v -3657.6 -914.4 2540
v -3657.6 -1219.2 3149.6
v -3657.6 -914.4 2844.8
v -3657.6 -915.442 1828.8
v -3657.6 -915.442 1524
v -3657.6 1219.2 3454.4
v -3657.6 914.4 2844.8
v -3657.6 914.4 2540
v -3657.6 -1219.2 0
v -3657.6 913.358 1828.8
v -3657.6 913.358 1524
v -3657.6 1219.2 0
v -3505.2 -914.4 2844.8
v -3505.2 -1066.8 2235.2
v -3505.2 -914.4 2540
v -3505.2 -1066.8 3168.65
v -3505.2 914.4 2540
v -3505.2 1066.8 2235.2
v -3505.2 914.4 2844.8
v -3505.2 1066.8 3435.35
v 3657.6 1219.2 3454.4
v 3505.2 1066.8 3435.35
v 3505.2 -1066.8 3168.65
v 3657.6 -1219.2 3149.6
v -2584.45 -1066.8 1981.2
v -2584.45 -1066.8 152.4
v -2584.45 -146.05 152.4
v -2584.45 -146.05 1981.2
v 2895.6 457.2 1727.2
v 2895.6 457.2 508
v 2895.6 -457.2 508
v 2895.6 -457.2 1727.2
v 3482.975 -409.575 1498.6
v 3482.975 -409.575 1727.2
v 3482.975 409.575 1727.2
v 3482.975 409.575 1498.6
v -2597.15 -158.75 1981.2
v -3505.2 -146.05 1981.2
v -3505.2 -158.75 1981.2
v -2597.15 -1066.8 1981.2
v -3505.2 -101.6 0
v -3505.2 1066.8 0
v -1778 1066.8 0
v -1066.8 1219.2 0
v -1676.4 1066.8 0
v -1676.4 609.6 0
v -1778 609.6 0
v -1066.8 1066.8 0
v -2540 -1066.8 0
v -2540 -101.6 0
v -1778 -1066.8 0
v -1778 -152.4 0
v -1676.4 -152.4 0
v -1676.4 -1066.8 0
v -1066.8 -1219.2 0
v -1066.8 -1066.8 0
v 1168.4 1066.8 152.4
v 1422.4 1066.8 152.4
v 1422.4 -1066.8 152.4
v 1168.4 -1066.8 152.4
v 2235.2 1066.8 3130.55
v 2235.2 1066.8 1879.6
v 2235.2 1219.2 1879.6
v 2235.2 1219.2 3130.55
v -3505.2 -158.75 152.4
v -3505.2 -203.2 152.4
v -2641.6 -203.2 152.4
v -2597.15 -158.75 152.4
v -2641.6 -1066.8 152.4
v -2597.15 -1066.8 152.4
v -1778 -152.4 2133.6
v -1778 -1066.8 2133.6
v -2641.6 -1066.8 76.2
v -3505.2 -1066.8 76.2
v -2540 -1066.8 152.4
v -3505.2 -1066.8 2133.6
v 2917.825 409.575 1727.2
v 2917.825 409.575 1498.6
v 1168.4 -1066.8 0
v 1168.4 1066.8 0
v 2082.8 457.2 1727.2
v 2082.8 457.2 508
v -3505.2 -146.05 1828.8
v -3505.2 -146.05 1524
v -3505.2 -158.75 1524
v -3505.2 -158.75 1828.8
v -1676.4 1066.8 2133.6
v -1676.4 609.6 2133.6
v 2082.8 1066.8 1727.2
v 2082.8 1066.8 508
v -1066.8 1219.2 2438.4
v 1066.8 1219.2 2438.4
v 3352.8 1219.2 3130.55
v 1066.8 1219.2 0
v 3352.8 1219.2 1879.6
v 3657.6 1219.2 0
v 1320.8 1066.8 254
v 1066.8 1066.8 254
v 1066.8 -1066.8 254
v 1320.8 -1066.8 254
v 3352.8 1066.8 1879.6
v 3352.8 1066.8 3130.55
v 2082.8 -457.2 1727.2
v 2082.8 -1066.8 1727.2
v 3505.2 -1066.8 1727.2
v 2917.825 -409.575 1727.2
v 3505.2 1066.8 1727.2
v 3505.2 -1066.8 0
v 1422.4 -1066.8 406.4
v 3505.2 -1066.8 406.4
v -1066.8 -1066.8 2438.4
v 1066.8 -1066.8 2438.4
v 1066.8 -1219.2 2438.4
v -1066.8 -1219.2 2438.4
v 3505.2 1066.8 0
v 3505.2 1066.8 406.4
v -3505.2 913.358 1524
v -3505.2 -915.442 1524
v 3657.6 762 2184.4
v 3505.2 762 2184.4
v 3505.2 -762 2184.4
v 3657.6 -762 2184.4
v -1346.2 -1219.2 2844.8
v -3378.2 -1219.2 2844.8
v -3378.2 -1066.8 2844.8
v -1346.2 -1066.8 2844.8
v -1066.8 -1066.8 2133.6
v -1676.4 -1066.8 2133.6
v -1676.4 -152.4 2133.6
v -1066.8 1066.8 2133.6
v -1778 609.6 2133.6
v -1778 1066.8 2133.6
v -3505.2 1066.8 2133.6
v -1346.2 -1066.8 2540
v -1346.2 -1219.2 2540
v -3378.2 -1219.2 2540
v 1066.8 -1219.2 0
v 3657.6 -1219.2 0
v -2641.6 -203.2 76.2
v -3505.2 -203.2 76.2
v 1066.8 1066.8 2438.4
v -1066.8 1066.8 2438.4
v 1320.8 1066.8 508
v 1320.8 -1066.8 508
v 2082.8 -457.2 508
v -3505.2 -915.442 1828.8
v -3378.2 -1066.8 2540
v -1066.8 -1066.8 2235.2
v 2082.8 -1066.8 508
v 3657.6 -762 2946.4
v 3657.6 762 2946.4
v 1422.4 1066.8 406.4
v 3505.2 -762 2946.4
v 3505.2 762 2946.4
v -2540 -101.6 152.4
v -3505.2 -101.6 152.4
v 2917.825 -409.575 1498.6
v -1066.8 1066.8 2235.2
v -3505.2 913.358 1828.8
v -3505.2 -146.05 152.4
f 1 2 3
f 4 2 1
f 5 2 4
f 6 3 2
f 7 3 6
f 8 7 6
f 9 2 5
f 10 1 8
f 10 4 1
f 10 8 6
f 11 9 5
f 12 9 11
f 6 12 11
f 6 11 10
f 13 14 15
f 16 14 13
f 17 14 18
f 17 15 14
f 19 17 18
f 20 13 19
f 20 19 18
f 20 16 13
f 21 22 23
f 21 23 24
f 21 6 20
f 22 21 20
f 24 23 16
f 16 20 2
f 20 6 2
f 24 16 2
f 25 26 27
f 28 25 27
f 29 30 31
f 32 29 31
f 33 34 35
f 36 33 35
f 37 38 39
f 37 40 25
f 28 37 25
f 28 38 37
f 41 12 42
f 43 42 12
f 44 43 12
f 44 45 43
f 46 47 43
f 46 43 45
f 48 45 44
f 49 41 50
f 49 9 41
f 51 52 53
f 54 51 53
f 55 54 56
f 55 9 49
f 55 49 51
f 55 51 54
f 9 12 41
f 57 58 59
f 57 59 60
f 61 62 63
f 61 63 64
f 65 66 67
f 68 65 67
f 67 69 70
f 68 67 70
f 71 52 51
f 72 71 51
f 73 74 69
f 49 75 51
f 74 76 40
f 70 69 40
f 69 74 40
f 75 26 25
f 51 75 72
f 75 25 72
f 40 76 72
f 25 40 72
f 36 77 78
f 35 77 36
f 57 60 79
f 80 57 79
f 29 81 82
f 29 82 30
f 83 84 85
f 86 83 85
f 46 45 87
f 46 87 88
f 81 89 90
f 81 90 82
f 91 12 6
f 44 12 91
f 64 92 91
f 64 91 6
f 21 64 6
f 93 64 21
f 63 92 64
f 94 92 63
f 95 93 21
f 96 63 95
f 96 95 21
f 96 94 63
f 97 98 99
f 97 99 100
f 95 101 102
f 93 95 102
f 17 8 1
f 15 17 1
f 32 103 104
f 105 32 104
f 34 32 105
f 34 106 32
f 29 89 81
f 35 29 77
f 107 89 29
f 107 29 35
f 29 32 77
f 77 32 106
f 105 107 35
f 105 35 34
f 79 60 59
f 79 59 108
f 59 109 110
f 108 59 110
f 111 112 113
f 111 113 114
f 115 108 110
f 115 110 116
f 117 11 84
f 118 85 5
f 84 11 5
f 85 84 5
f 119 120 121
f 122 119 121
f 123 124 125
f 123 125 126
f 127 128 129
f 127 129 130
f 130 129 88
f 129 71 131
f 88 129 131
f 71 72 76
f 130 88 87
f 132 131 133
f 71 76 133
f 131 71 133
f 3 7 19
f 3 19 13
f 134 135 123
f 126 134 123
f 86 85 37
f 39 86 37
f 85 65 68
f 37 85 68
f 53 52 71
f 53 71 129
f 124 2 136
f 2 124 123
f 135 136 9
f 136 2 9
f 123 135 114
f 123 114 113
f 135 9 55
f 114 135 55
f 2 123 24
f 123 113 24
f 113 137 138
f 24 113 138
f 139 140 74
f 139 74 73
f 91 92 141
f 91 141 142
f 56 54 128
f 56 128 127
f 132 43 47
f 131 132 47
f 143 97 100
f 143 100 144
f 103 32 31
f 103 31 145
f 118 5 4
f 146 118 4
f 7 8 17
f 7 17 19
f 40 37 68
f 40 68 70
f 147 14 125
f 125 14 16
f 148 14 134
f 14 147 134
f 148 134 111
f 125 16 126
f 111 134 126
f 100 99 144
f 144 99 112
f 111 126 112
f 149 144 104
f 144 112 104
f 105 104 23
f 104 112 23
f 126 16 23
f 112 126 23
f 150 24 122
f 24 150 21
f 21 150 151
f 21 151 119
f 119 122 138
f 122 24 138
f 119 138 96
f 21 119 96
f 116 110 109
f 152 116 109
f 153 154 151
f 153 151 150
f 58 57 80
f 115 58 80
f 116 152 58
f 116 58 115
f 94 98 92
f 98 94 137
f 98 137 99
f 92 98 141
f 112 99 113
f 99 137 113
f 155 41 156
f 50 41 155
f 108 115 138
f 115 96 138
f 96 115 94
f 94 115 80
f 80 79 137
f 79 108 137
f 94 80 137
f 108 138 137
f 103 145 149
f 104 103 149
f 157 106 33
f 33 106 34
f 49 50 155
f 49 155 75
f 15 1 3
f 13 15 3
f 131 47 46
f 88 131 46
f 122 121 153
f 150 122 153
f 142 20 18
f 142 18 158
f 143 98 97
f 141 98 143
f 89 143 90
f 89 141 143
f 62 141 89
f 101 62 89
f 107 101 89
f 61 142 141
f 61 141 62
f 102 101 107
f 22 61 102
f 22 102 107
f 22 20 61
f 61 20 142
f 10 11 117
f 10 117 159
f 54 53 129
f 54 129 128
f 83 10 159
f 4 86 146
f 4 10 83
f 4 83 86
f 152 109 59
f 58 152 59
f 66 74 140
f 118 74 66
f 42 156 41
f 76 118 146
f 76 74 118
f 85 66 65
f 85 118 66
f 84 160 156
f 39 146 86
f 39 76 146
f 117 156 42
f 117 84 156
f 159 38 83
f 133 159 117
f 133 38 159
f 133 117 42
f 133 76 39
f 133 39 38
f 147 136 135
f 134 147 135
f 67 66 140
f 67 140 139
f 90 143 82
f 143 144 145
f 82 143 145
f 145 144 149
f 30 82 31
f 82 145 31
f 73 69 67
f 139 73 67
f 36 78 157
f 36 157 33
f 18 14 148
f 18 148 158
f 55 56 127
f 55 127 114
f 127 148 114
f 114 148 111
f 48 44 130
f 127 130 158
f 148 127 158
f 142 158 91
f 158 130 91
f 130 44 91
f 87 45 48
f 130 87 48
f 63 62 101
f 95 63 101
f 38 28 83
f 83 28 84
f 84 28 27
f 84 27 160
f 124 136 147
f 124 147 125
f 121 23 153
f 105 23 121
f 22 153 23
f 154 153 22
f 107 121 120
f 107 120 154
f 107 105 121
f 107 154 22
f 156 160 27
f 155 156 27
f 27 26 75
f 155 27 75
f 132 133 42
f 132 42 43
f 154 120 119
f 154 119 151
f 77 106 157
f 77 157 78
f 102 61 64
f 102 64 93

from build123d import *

# Parameters (mm, degrees)
F0_W      = 7315.2
F0_H      = 2438.4
F1_DEPTH  = 3454.4
F2_T      = -152.4
F4_DEPTH  = 7315.2
F5_W      = 2133.6
F5_H      = 2438.4
F6_DEPTH  = 2438.4
F7_W      = 7010.4
F7_H      = 2133.6
F8_DEPTH  = 152.4
F9_W      = 2133.6
F9_H      = 101.6
F10_DEPTH = 2438.4
F12_DEPTH = 2133.6
F13_W     = 1117.6
F13_H     = 1250.95
F14_DEPTH = 152.4
F16_DEPTH = 1219.2
F17_W     = 1524
F17_H     = 762
F18_DEPTH = 152.4
F19_W     = 565.15
F19_H     = 819.15
F20_DEPTH = 228.6
F22_W     = 1828.8
F22_H     = 304.8
F23_DEPTH = 152.4
F24_W     = 101.6
F24_H     = 914.4
F24_H_2   = 457.2
F25_DEPTH = 2133.6
F26_W     = 965.2
F26_H     = 965.2
F27_DEPTH = 152.4
F28_W     = 863.6
F28_H     = 863.6
F29_DEPTH = 76.2
F31_DEPTH = 1828.8
F32_W     = 2032
F32_H     = 304.8
F33_DEPTH = 152.4


with BuildPart() as f1:
    # F0 (on Top) → F1 (new body)
    with BuildSketch(Plane.XY):
        Rectangle(F0_W, F0_H)
    extrude(amount=F1_DEPTH)

    # F2
    f2_openings = [f1.faces().sort_by_distance(p)[0] for p in [
        (0, 0, 3454.4),
    ]]
    offset(amount=F2_T, openings=f2_openings)

    # F3 (on face) → F4 (cut, through all)
    with BuildSketch(Plane(origin=(-3657.6, 0, 0), x_dir=(0, -1, 0), z_dir=(-1, 0, 0))):
        Polygon((1219.2, 3454.4), (-1219.2, 3454.4), (1219.2, 3149.6), align=None)
    extrude(amount=-F4_DEPTH, mode=Mode.SUBTRACT)

    # F5 (on face) → F6 (cut, through all)
    with BuildSketch(Plane(origin=(0, 1219.2, 0), x_dir=(-1, 0, 0), z_dir=(0, 1, 0))):
        with Locations((0, 1219.2)):
            Rectangle(F5_W, F5_H)
    extrude(amount=-F6_DEPTH, mode=Mode.SUBTRACT)

    # F7 (on face) → F8 (cut, through all)
    with BuildSketch(Plane.XY.offset(152.4)):
        Rectangle(F7_W, F7_H)
    extrude(amount=-F8_DEPTH, mode=Mode.SUBTRACT)

    # F9 (on face) → F10 (join)
    with BuildSketch(Plane.YZ.offset(-3505.2)):
        with Locations((0, 2184.4)):
            Rectangle(F9_W, F9_H)
    extrude(amount=F10_DEPTH)

    # F11 (on face) → F12 (join, through all)
    with BuildSketch(Plane(origin=(0, -1066.8, 0), x_dir=(-1, 0, 0), z_dir=(0, 1, 0))):
        Polygon((-1168.4, 0), (-1066.8, 0), (-1066.8, 254), (-1320.8, 254), (-1320.8, 508), (-3657.6, 508), (-3657.6, 406.4), (-1422.4, 406.4), (-1422.4, 152.4), (-1168.4, 152.4), align=None)
    extrude(amount=F12_DEPTH)

    # F13 (on face) → F14 (cut, through all)
    with BuildSketch(Plane.XZ.offset(-1066.8)):
        with Locations((2794, 2505.075)):
            Rectangle(F13_W, F13_H)
    extrude(amount=-F14_DEPTH, mode=Mode.SUBTRACT)

    # F15 (on face) → F16 (join)
    with BuildSketch(Plane.XY.offset(508)):
        Polygon((3505.2, 1066.8), (2082.8, 1066.8), (2082.8, 457.2), (2895.6, 457.2), (2895.6, -457.2), (2082.8, -457.2), (2082.8, -1066.8), (3505.2, -1066.8), align=None)
    extrude(amount=F16_DEPTH)

    # F17 (on face) → F18 (cut, through all)
    with BuildSketch(Plane(origin=(3505.2, 0, 0), x_dir=(0, -1, 0), z_dir=(-1, 0, 0))):
        with Locations((0, 2565.4)):
            Rectangle(F17_W, F17_H)
    extrude(amount=-F18_DEPTH, mode=Mode.SUBTRACT)

    # F19 (on face) → F20 (cut)
    with BuildSketch(Plane.XY.offset(1727.2)):
        with Locations((3200.4, 0)):
            Rectangle(F19_W, F19_H)
    extrude(amount=-F20_DEPTH, mode=Mode.SUBTRACT)

    # F22 (on face) → F23 (cut, through all)
    with BuildSketch(Plane(origin=(-3657.6, 0, 0), x_dir=(0, -1, 0), z_dir=(-1, 0, 0))):
        with Locations((0, 2692.4)):
            Rectangle(F22_W, F22_H)
        with Locations((1.0416096687, 1676.4)):
            Rectangle(F22_W, F22_H)
    extrude(amount=-F23_DEPTH, mode=Mode.SUBTRACT)

    # F24 (on face) → F25 (join, through all)
    with BuildSketch(Plane(origin=(0, 0, 0), x_dir=(1, 0, 0), z_dir=(0, 0, -1))):
        with Locations((-1727.2, 609.6)):
            Rectangle(F24_W, F24_H)
        with Locations((-1727.2, -838.2)):
            Rectangle(F24_W, F24_H_2)
    extrude(amount=-F25_DEPTH)

    # F26 (on face) → F27 (join)
    with BuildSketch(Plane(origin=(0, 0, 0), x_dir=(1, 0, 0), z_dir=(0, 0, -1))):
        with Locations((-3022.6, 584.2)):
            Rectangle(F26_W, F26_H)
    extrude(amount=-F27_DEPTH)

    # F28 (on face) → F29 (cut)
    with BuildSketch(Plane.XY.offset(152.4)):
        with Locations((-3073.4, -635)):
            Rectangle(F28_W, F28_H)
    extrude(amount=-F29_DEPTH, mode=Mode.SUBTRACT)

    # F30 (on face) → F31 (join)
    with BuildSketch(Plane.XY.offset(152.4)):
        Polygon((-2584.45, -146.05), (-3505.2, -146.05), (-3505.2, -158.75), (-2597.15, -158.75), (-2597.15, -1066.8), (-2584.45, -1066.8), align=None)
    extrude(amount=F31_DEPTH)

    # F32 (on face) → F33 (cut, through all)
    with BuildSketch(Plane.XZ.offset(1219.2)):
        with Locations((-2362.2, 2692.4)):
            Rectangle(F32_W, F32_H)
    extrude(amount=-F33_DEPTH, mode=Mode.SUBTRACT)


solid = f1.part
